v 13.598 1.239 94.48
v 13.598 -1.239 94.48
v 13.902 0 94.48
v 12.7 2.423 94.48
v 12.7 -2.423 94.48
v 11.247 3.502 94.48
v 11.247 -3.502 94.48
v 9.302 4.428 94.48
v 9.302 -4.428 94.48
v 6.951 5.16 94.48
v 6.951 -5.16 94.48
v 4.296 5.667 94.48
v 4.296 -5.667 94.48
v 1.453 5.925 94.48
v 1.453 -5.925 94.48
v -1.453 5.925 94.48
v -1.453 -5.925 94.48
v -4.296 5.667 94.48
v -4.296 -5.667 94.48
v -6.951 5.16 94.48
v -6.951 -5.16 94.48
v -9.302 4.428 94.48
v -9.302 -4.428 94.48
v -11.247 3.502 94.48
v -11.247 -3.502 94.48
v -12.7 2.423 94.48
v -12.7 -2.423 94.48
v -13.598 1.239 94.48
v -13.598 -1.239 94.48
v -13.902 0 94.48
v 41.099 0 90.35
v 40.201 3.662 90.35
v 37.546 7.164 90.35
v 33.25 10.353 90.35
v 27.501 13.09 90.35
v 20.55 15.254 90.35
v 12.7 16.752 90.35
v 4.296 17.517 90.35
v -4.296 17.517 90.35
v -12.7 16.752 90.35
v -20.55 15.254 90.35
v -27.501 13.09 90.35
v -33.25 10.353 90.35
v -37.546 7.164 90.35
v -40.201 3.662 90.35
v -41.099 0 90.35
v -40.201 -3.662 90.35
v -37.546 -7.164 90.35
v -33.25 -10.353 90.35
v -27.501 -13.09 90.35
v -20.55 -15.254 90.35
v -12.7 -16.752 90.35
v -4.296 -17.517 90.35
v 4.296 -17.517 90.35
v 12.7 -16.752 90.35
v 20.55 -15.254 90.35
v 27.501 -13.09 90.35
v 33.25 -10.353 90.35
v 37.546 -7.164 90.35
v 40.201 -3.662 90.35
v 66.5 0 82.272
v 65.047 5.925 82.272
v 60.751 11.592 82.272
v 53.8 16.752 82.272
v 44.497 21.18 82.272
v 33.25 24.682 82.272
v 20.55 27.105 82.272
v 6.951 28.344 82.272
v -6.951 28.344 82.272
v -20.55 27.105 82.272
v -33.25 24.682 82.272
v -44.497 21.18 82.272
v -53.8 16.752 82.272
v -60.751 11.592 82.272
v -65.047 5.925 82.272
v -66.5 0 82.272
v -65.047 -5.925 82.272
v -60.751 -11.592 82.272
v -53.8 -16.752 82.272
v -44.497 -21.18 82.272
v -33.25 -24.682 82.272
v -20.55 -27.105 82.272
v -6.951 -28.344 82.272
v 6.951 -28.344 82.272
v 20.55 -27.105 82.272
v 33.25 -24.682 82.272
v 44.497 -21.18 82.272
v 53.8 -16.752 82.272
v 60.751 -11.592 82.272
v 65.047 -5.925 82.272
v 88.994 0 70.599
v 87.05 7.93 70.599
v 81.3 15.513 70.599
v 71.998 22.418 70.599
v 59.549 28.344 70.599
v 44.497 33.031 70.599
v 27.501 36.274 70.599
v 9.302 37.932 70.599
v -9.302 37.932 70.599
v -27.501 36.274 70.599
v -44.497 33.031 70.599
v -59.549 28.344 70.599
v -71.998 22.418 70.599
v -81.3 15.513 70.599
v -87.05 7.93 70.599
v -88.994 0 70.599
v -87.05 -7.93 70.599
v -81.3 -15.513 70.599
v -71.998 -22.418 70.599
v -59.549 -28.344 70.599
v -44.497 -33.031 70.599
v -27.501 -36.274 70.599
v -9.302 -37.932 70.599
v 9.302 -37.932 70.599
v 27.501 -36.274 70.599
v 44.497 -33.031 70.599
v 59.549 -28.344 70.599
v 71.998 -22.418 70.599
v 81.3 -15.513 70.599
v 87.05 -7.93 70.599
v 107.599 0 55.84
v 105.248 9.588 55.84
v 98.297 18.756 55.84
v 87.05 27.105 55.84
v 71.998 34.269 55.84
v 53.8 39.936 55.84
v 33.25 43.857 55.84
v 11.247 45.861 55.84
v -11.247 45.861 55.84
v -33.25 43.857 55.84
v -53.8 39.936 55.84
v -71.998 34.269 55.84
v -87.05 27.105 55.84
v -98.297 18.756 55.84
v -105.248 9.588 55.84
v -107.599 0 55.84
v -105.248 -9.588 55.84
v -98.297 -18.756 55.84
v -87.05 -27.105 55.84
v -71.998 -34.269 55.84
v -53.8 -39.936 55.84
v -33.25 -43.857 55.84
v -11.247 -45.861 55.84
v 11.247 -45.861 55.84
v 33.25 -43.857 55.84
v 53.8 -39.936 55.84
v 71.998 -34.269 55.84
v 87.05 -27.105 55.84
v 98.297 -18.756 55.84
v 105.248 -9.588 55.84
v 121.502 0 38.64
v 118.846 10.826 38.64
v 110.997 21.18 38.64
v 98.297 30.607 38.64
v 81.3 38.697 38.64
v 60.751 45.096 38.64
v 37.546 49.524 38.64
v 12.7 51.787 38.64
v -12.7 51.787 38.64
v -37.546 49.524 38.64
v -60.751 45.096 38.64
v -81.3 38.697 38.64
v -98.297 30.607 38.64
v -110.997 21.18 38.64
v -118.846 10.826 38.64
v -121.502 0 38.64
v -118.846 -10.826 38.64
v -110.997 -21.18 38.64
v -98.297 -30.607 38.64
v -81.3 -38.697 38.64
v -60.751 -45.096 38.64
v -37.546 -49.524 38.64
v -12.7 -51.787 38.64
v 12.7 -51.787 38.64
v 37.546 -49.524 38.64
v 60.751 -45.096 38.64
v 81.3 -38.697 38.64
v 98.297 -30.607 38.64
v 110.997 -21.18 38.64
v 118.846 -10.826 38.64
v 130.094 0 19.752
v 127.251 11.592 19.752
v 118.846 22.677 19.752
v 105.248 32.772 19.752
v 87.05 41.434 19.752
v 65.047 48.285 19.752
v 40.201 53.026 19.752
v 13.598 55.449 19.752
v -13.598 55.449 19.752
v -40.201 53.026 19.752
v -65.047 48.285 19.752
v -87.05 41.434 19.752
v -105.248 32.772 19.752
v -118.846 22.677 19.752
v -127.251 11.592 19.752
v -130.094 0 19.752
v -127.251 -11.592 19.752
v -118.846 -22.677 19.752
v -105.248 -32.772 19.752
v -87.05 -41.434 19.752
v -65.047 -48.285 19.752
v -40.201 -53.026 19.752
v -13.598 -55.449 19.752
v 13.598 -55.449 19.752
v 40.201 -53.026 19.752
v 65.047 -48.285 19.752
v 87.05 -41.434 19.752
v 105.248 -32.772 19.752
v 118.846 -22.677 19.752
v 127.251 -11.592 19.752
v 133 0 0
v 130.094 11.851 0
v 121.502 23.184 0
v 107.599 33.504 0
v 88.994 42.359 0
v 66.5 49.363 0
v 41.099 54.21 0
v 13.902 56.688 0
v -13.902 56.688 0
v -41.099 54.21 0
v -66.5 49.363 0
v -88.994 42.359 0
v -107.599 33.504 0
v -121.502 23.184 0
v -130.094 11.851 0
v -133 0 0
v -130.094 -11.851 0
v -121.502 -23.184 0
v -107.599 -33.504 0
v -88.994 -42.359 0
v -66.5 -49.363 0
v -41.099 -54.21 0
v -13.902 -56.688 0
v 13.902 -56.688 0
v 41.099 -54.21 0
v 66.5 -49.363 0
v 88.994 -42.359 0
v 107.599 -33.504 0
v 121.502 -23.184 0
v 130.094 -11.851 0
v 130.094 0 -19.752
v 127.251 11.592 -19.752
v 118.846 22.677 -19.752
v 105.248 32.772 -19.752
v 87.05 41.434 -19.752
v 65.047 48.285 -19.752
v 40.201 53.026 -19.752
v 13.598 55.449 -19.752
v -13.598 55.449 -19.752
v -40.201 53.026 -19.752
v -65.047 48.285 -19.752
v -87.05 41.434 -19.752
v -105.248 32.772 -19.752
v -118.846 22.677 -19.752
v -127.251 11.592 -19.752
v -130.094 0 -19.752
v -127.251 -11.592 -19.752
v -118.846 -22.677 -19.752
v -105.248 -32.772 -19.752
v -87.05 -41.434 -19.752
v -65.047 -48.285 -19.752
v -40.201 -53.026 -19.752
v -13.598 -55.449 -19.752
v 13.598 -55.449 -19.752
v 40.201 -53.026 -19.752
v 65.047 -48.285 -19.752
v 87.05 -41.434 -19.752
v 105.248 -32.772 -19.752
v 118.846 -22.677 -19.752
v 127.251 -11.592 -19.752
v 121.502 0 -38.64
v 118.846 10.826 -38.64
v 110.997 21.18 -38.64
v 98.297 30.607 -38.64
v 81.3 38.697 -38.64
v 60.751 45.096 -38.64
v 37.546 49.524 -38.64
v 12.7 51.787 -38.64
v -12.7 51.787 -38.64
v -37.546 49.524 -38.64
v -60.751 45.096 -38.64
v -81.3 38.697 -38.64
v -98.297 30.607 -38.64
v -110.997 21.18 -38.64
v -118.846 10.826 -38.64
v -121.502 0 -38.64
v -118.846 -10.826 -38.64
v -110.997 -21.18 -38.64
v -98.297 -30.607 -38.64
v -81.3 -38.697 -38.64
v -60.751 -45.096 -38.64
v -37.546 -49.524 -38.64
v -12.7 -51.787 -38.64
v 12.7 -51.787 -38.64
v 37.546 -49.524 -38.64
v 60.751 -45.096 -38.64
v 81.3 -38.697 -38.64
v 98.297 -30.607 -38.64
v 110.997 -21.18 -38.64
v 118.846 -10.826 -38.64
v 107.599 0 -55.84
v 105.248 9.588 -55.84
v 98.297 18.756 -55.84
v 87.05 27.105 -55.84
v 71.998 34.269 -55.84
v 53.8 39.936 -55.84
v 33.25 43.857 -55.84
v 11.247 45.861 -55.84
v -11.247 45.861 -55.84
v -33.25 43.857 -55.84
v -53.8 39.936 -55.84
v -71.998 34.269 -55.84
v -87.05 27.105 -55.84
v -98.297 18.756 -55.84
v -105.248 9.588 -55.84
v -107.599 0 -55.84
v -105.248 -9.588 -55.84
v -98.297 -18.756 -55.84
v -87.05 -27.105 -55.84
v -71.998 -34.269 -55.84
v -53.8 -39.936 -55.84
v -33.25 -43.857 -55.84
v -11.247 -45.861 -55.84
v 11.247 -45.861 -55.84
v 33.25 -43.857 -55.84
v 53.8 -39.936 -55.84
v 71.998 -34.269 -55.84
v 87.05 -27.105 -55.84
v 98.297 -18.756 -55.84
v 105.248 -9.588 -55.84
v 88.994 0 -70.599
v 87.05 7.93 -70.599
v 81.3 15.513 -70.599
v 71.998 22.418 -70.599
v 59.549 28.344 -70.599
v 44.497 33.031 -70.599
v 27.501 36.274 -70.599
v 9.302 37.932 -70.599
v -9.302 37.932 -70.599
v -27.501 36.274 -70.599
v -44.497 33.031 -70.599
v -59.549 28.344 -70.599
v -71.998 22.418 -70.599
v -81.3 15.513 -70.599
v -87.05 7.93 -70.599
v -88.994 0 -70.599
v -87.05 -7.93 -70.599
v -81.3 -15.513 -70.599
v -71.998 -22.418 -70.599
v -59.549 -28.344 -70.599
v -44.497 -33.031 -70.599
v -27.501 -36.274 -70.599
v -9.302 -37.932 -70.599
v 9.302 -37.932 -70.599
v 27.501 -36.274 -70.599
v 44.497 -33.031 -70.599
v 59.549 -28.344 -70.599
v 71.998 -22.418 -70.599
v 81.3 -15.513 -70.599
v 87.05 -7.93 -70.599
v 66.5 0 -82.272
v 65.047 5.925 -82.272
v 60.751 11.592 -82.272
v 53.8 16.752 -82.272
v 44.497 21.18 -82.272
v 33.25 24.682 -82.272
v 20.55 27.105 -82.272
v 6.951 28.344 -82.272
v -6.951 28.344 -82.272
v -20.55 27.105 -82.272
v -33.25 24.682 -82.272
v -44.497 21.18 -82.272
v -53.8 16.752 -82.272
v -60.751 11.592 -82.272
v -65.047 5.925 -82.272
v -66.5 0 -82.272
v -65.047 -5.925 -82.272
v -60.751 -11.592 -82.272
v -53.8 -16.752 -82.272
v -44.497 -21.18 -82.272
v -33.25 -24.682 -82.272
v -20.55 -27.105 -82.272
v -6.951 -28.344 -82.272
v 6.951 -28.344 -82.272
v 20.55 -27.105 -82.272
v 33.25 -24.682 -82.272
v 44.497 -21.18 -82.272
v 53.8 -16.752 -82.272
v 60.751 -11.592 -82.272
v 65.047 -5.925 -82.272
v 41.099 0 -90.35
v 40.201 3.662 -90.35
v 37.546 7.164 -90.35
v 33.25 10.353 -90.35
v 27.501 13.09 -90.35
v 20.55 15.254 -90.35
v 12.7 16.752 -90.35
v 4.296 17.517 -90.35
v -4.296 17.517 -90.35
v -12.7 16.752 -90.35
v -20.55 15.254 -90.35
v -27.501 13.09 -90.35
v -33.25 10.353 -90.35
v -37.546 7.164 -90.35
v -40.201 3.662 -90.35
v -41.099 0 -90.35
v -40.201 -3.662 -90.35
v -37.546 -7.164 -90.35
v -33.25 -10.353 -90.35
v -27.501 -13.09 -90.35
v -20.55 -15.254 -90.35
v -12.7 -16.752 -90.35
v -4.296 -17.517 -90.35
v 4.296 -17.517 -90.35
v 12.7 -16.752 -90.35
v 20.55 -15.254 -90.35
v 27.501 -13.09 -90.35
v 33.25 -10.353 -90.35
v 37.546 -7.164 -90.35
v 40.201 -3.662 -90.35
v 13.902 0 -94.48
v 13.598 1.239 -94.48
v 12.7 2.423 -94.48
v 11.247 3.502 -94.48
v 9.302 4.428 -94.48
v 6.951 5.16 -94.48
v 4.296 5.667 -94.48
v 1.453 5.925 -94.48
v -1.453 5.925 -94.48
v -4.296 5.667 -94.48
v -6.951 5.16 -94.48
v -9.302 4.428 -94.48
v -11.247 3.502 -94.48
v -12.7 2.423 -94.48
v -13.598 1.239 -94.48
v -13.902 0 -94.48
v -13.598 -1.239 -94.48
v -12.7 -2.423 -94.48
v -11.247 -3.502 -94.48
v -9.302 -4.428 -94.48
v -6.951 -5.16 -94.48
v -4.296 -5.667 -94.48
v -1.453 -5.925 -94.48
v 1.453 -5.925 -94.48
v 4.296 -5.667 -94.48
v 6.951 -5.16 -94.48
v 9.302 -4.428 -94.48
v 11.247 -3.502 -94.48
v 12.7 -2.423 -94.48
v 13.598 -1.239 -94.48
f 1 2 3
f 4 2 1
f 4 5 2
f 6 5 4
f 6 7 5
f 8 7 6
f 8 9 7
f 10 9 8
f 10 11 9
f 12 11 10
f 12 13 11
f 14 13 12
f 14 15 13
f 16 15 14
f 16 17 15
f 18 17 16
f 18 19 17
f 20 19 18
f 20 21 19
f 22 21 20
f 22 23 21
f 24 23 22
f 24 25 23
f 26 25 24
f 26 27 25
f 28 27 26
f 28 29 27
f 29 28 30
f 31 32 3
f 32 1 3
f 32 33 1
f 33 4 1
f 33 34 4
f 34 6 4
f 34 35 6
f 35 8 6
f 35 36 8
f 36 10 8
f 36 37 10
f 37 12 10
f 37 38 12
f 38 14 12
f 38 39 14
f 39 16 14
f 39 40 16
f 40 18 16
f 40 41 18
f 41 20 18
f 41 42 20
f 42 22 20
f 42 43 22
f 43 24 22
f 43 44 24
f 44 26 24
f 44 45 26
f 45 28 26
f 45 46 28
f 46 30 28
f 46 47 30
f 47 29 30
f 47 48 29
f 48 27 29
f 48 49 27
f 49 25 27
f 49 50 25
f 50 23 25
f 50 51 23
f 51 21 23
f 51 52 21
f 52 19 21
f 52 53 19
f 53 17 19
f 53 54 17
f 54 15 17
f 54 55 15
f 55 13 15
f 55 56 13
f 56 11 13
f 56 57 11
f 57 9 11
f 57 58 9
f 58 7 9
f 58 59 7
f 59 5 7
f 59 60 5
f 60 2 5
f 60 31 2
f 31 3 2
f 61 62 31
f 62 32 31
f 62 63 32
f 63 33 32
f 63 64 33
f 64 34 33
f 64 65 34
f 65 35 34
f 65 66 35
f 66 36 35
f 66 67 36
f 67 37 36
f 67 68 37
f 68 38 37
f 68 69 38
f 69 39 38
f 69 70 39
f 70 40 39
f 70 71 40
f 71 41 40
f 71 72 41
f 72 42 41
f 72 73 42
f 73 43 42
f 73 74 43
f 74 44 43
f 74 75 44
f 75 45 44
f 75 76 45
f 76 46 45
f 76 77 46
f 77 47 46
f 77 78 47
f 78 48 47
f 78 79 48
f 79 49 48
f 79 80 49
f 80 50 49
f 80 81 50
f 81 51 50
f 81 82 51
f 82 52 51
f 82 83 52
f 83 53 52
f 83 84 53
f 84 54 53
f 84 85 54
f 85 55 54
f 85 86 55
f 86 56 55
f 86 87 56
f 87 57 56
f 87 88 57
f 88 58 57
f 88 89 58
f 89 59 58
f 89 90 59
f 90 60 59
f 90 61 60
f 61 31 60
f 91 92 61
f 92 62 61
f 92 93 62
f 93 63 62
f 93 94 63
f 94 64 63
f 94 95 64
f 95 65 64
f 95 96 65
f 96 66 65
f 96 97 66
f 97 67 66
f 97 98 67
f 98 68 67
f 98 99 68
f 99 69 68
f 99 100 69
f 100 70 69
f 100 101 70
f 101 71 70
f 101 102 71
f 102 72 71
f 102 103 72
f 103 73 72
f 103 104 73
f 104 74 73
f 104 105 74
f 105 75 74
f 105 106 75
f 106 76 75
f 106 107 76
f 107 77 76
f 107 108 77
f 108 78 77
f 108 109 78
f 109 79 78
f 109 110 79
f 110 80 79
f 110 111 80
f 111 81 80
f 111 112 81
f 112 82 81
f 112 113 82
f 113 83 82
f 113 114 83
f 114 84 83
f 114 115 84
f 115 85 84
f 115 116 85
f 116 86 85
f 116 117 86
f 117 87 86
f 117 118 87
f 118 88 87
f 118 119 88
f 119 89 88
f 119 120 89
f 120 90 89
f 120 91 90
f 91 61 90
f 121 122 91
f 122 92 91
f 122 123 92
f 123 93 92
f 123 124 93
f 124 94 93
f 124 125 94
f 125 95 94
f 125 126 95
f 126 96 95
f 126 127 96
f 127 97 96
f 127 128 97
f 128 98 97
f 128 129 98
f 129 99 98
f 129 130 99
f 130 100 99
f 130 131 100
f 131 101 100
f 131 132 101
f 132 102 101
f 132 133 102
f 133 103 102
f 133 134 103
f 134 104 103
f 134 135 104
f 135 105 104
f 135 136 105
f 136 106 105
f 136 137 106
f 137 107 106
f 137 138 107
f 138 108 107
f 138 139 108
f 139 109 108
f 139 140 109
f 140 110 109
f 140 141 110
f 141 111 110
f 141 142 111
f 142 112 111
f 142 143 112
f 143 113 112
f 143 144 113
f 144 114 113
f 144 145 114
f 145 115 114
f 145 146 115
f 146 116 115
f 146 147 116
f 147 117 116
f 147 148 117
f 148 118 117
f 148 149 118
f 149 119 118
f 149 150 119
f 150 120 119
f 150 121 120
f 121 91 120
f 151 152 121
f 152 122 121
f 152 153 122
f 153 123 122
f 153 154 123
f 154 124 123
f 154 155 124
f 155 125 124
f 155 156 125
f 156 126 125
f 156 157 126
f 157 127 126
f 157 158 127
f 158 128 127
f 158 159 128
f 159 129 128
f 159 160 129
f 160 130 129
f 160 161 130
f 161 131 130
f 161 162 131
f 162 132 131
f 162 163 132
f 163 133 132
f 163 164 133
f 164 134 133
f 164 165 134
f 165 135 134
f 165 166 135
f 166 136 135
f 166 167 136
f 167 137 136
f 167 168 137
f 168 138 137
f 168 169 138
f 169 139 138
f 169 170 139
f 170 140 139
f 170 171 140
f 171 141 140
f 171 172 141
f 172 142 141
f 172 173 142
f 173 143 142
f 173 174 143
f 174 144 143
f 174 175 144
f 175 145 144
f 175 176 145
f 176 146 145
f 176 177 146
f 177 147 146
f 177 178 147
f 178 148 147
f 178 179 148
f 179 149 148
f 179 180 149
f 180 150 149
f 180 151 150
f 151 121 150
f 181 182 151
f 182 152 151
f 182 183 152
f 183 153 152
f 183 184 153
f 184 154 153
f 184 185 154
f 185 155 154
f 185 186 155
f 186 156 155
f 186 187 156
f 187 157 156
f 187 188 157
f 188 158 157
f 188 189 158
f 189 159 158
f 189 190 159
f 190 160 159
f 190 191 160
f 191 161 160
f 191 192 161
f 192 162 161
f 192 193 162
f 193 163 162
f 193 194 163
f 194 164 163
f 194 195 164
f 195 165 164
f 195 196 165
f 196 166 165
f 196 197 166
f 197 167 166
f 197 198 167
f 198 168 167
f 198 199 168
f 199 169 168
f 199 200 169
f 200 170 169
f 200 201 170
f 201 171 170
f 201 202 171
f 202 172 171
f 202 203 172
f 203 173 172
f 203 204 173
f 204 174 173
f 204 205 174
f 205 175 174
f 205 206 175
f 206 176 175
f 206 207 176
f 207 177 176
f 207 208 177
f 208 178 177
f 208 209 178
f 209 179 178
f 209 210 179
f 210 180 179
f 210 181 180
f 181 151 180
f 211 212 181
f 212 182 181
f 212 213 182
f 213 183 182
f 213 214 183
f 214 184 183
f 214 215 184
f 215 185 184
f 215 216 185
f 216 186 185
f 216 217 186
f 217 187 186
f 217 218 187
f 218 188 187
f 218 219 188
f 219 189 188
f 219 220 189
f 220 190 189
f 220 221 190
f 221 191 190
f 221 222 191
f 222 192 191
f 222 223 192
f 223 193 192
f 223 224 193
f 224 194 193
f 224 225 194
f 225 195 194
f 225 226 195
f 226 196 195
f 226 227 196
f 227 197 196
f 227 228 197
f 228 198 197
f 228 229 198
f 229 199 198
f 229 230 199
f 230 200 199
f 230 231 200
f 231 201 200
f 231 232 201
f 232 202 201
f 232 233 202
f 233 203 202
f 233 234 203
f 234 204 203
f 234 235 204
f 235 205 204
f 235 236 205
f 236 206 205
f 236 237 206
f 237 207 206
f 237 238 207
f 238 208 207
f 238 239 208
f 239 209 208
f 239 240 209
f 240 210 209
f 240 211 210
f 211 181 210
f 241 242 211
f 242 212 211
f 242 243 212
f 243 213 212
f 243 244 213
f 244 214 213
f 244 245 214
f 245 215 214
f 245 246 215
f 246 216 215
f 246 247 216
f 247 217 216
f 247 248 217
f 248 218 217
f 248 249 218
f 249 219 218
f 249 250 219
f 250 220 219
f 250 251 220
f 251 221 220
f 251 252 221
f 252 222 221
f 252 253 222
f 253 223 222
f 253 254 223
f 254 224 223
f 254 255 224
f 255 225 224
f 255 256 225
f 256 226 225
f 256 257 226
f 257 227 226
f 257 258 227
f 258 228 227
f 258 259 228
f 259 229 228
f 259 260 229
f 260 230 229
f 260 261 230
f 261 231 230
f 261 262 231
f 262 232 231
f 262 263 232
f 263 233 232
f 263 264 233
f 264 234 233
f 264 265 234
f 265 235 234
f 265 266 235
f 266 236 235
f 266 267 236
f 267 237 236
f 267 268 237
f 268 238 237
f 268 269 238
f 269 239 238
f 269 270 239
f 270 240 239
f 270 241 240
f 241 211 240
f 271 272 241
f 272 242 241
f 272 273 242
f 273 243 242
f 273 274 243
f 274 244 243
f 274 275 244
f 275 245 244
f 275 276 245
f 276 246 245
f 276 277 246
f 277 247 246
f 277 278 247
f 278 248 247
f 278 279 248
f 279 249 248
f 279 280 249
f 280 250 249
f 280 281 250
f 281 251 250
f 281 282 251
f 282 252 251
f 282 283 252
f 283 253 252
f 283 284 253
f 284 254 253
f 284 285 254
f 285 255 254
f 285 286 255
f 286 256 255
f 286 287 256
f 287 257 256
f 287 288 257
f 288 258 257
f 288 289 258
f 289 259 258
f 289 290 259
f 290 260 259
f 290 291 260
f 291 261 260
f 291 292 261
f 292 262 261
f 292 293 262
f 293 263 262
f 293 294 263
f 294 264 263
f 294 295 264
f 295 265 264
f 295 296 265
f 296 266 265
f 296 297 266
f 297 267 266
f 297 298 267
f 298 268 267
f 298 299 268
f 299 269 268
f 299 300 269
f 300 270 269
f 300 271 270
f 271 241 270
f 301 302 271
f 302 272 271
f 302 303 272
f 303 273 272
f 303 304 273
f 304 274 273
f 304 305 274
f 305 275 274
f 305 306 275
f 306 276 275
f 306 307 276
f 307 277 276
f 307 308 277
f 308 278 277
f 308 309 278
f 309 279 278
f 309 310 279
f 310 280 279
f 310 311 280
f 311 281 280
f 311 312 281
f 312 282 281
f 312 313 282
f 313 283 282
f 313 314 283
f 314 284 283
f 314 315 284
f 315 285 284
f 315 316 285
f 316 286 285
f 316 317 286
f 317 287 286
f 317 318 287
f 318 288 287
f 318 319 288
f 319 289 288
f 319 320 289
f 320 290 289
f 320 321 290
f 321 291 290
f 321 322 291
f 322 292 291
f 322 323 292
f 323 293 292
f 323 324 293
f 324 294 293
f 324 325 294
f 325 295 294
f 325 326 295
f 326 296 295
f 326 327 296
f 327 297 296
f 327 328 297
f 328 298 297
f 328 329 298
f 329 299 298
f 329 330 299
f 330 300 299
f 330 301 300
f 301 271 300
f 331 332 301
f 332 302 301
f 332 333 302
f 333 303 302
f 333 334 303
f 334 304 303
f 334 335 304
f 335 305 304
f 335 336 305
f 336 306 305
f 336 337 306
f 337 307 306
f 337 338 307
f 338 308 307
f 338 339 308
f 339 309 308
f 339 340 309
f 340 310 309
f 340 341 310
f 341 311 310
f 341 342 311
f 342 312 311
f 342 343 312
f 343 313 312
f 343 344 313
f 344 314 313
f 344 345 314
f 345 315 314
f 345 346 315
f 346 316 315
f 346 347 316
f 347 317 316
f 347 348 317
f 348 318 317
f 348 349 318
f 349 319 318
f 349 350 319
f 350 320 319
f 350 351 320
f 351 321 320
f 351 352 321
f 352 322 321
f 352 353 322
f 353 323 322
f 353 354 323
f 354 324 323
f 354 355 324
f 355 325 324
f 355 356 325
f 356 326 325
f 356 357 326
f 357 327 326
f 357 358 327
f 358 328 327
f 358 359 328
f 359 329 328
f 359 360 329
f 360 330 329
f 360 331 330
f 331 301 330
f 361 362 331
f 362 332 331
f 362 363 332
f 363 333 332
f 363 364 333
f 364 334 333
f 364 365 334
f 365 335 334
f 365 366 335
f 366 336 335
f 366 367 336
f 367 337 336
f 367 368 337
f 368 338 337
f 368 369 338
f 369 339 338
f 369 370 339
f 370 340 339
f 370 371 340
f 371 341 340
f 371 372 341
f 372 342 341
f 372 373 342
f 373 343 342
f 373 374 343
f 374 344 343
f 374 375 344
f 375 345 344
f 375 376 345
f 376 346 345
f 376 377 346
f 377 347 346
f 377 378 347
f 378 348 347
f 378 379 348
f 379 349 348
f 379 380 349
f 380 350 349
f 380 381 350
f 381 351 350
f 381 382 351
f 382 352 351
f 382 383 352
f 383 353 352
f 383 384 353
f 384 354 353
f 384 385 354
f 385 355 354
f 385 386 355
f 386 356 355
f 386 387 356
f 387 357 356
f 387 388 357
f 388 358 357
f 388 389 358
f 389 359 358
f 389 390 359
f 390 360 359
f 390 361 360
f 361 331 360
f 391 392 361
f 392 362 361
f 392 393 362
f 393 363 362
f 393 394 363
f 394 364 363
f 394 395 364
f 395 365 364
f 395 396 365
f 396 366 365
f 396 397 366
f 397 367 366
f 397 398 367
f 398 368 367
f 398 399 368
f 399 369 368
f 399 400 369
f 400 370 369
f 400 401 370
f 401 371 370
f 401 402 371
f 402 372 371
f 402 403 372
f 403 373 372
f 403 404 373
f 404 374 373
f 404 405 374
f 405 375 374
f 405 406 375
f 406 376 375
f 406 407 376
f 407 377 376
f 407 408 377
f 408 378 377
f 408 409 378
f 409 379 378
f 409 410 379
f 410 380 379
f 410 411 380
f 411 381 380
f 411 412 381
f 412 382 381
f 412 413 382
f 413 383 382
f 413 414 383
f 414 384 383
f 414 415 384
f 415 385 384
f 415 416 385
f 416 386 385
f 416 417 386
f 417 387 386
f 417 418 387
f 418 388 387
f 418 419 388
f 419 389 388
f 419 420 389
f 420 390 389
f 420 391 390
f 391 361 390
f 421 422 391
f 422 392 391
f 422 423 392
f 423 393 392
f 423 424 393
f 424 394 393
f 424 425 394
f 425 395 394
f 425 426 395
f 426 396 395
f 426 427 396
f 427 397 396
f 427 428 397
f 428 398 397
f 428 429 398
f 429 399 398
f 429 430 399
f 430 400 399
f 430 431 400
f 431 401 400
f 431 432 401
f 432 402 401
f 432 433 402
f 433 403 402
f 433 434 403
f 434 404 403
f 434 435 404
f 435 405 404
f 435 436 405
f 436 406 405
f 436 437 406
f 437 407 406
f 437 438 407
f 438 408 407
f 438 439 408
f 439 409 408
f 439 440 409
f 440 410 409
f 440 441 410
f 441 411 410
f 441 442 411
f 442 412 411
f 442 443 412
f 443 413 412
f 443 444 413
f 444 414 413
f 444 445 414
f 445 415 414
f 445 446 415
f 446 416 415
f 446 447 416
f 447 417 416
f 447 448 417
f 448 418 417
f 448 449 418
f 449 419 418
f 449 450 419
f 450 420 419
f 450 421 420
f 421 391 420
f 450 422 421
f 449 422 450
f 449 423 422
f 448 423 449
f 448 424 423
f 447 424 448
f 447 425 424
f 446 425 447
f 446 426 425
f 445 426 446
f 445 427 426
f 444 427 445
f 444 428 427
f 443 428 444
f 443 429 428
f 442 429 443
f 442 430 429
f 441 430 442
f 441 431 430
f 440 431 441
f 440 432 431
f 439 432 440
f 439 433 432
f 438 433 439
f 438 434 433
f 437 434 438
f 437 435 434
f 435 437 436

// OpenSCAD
// Generated by SolidPython 1.0.1 on 2020-07-29 00:46:47


scale(v = [7, 3, 5]) {
	sphere(r = 19);
}
/***********************************************
*********      SolidPython code:      **********
************************************************
 
# import packages: SolidPython
from solid import *
from solid.utils import *
from itertools import chain, combinations, permutations


class Resize:

    def __init__(self, scad_file):
        self.scad_file = scad_file
        #self.scad_file = import_scad(scad_file)
        # cone/cylinder param:
        self.r1 = 0
        self.r2 = 0
        self.h = 0
        # rectangular prism param:
        self.w = 0
        self.l = 0
        # ellipse param:
        self.r = 0

    # import OpenScad code (file name corresponds to shape)


    # classify shape + parameters
    def assign(self, param1, param2, param3):
        if self.scad_file == 'cone.scad':
            self.r1 = param1
            self.r2 = param2
            self.h = param3
        elif self.scad_file == 'cylinder.scad':
            self.r1 = param1
            self.r2 = param2
            self.h = param3
        elif self.scad_file == 'rectangularPrism.scad':
            self.h = param1
            self.l = param2
            self.w = param3
        else:
            self.r = param1
            self.h = param2

    # resize parameters
    def iterate(self):
        x = range(3, 20, 2)
        i = 1
        if self.scad_file == 'cone.scad':
            tempList = list(permutations(x, 2))
            for temp in tempList:
                param1 = temp[0]
                param2 = temp[1]
                filepath = 'produced_scad_files/' + 'cone' + str(param1) + '_' + str(param2) + '_' + '.scad'
                scad_render_to_file(cylinder(h=param1, r1=param2, r2=0), filepath)

        elif self.scad_file == 'cylinder.scad':
            tempList = list(permutations(x, 3))
            for temp in tempList:
                param1 = temp[0]
                param2 = temp[1]
                filepath = 'produced_scad_files/' + 'cylinder' + str(param1) + '_' + str(param2) + '_' + '.scad'
                scad_render_to_file(cylinder(h=param1, r1=param2, r2=param2), filepath)

        elif self.scad_file == 'rectangularPrism.scad':
            tempList = list(permutations(x, 3))
            for temp in tempList:
                param1 = temp[0]
                param2 = temp[1]
                param3 = temp[2]
                filepath = 'produced_scad_files/' + 'rectangularPrism' + str(param1) + '_' + str(param2) + '_' + str(
                    param3) + '.scad'
                scad_render_to_file(cube(size=(param1, param2, param3)), filepath)

        elif self.scad_file == 'ellipse.scad':
            tempList = list(permutations(x, 4))
            for temp in tempList:
                param1 = temp[0]
                param2 = temp[1]
                param3 = temp[2]
                param4 = temp[3]
                filepath = 'produced_scad_files/' + 'ellipse' + str(param1) + '_' + str(param2) + '_' + str(param3) + '_' + str(param4) + '.scad'
                scad_render_to_file(scale([param1, param2, param3])(sphere(r=param4)), filepath)

    def render_to_scadfile(self):
        scad_render_to_file(scad, 'example.scad') 
 
************************************************/
